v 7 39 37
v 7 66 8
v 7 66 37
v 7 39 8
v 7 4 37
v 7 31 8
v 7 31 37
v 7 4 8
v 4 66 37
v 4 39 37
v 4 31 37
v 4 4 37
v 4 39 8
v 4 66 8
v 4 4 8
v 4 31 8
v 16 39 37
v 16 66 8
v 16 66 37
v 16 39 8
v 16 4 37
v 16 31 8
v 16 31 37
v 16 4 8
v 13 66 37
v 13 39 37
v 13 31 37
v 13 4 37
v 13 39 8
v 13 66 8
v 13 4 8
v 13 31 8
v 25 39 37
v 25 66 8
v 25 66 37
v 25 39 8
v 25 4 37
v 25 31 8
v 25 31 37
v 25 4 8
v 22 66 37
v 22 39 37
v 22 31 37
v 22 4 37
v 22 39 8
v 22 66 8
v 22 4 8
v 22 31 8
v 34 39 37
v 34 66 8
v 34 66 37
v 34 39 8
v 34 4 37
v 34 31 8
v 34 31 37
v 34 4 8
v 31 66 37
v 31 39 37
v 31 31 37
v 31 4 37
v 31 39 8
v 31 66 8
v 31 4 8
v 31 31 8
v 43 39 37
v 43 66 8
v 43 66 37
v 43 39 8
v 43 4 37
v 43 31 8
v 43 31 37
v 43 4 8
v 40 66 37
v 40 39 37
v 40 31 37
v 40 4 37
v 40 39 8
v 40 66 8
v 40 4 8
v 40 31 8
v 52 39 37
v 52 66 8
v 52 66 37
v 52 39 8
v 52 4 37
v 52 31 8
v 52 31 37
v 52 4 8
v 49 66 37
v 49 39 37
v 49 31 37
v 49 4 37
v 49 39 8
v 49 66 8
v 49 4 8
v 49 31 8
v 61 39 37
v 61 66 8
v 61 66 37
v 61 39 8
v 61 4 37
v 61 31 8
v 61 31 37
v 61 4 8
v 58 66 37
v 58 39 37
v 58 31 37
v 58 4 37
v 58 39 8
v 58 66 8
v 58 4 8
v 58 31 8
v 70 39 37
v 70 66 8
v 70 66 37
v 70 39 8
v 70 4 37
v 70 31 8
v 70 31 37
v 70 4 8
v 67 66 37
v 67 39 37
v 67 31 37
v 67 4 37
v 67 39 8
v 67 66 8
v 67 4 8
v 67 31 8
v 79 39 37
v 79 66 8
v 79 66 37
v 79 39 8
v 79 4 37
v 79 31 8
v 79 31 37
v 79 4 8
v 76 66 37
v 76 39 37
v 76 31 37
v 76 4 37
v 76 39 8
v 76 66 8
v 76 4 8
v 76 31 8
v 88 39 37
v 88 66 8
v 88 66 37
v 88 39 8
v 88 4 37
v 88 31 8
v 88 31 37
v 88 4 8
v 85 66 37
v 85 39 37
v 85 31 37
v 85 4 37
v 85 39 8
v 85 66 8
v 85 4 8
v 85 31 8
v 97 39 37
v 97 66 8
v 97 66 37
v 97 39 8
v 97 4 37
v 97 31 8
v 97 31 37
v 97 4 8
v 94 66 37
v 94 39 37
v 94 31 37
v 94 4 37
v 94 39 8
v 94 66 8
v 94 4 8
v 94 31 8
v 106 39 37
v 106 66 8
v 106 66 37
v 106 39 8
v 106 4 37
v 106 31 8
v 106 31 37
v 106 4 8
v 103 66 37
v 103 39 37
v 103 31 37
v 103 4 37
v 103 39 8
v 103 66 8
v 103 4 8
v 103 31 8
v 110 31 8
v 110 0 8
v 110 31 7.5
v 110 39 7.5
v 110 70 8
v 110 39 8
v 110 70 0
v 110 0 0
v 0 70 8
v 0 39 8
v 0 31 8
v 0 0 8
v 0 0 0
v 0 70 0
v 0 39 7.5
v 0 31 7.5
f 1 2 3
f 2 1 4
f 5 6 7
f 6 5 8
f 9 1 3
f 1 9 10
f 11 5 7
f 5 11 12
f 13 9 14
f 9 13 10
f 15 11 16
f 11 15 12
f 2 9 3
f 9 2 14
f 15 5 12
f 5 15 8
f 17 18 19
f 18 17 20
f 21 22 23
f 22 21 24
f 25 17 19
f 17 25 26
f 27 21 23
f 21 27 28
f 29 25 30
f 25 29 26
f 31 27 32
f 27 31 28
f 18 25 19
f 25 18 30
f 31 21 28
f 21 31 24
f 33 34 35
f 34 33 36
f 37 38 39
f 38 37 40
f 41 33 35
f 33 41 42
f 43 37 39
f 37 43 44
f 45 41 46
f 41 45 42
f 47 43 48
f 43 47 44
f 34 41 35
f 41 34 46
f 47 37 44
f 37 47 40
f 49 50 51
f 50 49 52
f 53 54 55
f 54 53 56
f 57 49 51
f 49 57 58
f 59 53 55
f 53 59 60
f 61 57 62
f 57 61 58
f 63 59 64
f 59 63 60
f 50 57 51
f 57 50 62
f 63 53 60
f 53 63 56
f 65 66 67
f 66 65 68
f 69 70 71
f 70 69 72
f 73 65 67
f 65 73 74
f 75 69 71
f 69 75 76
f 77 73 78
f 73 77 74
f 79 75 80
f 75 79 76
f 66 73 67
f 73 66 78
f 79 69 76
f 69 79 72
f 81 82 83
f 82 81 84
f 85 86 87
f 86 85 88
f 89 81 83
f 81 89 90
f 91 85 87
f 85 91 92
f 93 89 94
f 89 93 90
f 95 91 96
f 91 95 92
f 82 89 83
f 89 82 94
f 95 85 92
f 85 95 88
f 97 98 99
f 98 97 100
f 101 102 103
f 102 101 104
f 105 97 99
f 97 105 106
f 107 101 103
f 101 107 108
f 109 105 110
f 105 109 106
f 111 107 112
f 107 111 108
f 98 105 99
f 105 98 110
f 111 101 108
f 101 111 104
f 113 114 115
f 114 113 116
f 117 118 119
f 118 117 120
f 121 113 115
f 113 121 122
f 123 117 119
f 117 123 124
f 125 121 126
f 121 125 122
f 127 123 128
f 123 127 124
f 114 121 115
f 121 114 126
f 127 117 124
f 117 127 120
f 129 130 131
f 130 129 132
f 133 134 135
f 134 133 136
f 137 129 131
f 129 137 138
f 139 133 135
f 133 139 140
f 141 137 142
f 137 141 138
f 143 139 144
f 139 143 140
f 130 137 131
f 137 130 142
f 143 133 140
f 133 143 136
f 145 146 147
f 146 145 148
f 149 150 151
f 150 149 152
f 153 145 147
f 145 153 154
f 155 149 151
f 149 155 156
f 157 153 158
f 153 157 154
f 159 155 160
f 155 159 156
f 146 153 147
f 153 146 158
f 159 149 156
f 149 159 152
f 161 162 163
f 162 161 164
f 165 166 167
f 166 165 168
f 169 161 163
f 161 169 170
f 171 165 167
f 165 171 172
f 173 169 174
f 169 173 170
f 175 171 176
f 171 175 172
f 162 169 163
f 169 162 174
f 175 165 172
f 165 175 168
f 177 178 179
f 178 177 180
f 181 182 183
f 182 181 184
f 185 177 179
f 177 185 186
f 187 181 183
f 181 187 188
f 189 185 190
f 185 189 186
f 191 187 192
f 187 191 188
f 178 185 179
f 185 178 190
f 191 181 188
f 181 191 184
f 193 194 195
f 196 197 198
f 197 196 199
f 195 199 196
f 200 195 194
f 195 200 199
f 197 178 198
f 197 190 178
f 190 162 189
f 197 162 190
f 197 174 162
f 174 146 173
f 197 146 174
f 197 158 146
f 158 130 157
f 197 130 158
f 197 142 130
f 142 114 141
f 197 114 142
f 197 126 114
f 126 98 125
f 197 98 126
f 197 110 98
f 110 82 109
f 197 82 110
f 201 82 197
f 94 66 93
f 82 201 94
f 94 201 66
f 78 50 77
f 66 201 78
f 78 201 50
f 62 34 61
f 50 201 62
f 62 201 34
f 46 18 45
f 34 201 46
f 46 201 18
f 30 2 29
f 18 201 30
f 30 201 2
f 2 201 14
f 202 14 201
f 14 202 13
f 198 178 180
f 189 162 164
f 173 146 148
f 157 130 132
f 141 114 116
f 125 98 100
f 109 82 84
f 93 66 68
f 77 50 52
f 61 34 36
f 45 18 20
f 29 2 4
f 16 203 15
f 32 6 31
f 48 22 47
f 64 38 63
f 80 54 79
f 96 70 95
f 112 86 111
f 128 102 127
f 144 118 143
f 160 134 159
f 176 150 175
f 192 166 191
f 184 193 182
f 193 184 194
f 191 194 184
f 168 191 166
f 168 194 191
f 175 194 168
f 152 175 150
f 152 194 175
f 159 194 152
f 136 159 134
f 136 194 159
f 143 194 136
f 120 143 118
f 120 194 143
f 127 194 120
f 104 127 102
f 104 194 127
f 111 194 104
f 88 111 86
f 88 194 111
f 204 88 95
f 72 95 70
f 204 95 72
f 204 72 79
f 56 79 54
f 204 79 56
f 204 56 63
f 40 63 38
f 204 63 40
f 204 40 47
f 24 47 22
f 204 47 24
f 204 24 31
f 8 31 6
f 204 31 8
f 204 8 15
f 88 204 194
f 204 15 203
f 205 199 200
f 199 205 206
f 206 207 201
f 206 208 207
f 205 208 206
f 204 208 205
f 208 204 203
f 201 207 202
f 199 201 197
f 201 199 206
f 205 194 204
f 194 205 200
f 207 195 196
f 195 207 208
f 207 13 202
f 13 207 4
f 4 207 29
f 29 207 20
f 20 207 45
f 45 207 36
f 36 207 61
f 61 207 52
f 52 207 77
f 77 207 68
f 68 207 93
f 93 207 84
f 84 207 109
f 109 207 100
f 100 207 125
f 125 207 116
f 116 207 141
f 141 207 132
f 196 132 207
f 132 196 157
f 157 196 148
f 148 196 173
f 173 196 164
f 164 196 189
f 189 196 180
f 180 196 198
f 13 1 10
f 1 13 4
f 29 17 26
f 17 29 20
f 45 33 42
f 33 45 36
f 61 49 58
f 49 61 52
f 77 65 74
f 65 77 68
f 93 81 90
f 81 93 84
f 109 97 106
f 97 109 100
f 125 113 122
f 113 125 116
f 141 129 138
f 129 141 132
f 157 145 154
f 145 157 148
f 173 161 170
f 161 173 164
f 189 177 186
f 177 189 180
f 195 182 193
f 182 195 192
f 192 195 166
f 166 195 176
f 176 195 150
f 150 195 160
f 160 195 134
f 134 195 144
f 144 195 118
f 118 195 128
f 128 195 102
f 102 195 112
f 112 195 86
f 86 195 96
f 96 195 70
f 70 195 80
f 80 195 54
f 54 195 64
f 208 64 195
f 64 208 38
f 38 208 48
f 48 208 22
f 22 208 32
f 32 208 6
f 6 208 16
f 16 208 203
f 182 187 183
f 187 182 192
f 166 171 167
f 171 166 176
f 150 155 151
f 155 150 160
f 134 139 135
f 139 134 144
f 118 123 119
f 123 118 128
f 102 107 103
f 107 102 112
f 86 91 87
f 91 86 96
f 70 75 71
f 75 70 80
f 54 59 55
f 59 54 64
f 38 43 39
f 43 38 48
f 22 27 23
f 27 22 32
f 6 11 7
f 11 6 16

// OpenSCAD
$fn = 32;

// ----------------------------------------------------------------------
// Heatsink: slotted fin block
// ----------------------------------------------------------------------

// --- parameters (mm) ---
base_l = 110;             // base length, X
base_w = 70;              // base width, Y
base_t = 8;               // base plate thickness
fin_h = 30;               // fin height above the base
fin_t = 3;                // fin thickness
edge = 4;                 // margin from the base ends
pitch = 9;                // fin pitch
slot_w = 8;               // central slot width, Y

n_fins = floor((base_l - 2 * edge - fin_t) / pitch) + 1;  // fin count
total_h = base_t + fin_h - 1;  // overall height

difference() {
union() {
  cube([base_l, base_w, base_t]);
  for (i = [0 : n_fins - 1])
    translate([edge + i * pitch, edge, base_t - 1])
      cube([fin_t, base_w - 2 * edge, fin_h]);
}
  translate([-1, base_w / 2 - slot_w / 2, base_t - 0.5])
    cube([base_l + 2, slot_w, fin_h + 2]);
}
